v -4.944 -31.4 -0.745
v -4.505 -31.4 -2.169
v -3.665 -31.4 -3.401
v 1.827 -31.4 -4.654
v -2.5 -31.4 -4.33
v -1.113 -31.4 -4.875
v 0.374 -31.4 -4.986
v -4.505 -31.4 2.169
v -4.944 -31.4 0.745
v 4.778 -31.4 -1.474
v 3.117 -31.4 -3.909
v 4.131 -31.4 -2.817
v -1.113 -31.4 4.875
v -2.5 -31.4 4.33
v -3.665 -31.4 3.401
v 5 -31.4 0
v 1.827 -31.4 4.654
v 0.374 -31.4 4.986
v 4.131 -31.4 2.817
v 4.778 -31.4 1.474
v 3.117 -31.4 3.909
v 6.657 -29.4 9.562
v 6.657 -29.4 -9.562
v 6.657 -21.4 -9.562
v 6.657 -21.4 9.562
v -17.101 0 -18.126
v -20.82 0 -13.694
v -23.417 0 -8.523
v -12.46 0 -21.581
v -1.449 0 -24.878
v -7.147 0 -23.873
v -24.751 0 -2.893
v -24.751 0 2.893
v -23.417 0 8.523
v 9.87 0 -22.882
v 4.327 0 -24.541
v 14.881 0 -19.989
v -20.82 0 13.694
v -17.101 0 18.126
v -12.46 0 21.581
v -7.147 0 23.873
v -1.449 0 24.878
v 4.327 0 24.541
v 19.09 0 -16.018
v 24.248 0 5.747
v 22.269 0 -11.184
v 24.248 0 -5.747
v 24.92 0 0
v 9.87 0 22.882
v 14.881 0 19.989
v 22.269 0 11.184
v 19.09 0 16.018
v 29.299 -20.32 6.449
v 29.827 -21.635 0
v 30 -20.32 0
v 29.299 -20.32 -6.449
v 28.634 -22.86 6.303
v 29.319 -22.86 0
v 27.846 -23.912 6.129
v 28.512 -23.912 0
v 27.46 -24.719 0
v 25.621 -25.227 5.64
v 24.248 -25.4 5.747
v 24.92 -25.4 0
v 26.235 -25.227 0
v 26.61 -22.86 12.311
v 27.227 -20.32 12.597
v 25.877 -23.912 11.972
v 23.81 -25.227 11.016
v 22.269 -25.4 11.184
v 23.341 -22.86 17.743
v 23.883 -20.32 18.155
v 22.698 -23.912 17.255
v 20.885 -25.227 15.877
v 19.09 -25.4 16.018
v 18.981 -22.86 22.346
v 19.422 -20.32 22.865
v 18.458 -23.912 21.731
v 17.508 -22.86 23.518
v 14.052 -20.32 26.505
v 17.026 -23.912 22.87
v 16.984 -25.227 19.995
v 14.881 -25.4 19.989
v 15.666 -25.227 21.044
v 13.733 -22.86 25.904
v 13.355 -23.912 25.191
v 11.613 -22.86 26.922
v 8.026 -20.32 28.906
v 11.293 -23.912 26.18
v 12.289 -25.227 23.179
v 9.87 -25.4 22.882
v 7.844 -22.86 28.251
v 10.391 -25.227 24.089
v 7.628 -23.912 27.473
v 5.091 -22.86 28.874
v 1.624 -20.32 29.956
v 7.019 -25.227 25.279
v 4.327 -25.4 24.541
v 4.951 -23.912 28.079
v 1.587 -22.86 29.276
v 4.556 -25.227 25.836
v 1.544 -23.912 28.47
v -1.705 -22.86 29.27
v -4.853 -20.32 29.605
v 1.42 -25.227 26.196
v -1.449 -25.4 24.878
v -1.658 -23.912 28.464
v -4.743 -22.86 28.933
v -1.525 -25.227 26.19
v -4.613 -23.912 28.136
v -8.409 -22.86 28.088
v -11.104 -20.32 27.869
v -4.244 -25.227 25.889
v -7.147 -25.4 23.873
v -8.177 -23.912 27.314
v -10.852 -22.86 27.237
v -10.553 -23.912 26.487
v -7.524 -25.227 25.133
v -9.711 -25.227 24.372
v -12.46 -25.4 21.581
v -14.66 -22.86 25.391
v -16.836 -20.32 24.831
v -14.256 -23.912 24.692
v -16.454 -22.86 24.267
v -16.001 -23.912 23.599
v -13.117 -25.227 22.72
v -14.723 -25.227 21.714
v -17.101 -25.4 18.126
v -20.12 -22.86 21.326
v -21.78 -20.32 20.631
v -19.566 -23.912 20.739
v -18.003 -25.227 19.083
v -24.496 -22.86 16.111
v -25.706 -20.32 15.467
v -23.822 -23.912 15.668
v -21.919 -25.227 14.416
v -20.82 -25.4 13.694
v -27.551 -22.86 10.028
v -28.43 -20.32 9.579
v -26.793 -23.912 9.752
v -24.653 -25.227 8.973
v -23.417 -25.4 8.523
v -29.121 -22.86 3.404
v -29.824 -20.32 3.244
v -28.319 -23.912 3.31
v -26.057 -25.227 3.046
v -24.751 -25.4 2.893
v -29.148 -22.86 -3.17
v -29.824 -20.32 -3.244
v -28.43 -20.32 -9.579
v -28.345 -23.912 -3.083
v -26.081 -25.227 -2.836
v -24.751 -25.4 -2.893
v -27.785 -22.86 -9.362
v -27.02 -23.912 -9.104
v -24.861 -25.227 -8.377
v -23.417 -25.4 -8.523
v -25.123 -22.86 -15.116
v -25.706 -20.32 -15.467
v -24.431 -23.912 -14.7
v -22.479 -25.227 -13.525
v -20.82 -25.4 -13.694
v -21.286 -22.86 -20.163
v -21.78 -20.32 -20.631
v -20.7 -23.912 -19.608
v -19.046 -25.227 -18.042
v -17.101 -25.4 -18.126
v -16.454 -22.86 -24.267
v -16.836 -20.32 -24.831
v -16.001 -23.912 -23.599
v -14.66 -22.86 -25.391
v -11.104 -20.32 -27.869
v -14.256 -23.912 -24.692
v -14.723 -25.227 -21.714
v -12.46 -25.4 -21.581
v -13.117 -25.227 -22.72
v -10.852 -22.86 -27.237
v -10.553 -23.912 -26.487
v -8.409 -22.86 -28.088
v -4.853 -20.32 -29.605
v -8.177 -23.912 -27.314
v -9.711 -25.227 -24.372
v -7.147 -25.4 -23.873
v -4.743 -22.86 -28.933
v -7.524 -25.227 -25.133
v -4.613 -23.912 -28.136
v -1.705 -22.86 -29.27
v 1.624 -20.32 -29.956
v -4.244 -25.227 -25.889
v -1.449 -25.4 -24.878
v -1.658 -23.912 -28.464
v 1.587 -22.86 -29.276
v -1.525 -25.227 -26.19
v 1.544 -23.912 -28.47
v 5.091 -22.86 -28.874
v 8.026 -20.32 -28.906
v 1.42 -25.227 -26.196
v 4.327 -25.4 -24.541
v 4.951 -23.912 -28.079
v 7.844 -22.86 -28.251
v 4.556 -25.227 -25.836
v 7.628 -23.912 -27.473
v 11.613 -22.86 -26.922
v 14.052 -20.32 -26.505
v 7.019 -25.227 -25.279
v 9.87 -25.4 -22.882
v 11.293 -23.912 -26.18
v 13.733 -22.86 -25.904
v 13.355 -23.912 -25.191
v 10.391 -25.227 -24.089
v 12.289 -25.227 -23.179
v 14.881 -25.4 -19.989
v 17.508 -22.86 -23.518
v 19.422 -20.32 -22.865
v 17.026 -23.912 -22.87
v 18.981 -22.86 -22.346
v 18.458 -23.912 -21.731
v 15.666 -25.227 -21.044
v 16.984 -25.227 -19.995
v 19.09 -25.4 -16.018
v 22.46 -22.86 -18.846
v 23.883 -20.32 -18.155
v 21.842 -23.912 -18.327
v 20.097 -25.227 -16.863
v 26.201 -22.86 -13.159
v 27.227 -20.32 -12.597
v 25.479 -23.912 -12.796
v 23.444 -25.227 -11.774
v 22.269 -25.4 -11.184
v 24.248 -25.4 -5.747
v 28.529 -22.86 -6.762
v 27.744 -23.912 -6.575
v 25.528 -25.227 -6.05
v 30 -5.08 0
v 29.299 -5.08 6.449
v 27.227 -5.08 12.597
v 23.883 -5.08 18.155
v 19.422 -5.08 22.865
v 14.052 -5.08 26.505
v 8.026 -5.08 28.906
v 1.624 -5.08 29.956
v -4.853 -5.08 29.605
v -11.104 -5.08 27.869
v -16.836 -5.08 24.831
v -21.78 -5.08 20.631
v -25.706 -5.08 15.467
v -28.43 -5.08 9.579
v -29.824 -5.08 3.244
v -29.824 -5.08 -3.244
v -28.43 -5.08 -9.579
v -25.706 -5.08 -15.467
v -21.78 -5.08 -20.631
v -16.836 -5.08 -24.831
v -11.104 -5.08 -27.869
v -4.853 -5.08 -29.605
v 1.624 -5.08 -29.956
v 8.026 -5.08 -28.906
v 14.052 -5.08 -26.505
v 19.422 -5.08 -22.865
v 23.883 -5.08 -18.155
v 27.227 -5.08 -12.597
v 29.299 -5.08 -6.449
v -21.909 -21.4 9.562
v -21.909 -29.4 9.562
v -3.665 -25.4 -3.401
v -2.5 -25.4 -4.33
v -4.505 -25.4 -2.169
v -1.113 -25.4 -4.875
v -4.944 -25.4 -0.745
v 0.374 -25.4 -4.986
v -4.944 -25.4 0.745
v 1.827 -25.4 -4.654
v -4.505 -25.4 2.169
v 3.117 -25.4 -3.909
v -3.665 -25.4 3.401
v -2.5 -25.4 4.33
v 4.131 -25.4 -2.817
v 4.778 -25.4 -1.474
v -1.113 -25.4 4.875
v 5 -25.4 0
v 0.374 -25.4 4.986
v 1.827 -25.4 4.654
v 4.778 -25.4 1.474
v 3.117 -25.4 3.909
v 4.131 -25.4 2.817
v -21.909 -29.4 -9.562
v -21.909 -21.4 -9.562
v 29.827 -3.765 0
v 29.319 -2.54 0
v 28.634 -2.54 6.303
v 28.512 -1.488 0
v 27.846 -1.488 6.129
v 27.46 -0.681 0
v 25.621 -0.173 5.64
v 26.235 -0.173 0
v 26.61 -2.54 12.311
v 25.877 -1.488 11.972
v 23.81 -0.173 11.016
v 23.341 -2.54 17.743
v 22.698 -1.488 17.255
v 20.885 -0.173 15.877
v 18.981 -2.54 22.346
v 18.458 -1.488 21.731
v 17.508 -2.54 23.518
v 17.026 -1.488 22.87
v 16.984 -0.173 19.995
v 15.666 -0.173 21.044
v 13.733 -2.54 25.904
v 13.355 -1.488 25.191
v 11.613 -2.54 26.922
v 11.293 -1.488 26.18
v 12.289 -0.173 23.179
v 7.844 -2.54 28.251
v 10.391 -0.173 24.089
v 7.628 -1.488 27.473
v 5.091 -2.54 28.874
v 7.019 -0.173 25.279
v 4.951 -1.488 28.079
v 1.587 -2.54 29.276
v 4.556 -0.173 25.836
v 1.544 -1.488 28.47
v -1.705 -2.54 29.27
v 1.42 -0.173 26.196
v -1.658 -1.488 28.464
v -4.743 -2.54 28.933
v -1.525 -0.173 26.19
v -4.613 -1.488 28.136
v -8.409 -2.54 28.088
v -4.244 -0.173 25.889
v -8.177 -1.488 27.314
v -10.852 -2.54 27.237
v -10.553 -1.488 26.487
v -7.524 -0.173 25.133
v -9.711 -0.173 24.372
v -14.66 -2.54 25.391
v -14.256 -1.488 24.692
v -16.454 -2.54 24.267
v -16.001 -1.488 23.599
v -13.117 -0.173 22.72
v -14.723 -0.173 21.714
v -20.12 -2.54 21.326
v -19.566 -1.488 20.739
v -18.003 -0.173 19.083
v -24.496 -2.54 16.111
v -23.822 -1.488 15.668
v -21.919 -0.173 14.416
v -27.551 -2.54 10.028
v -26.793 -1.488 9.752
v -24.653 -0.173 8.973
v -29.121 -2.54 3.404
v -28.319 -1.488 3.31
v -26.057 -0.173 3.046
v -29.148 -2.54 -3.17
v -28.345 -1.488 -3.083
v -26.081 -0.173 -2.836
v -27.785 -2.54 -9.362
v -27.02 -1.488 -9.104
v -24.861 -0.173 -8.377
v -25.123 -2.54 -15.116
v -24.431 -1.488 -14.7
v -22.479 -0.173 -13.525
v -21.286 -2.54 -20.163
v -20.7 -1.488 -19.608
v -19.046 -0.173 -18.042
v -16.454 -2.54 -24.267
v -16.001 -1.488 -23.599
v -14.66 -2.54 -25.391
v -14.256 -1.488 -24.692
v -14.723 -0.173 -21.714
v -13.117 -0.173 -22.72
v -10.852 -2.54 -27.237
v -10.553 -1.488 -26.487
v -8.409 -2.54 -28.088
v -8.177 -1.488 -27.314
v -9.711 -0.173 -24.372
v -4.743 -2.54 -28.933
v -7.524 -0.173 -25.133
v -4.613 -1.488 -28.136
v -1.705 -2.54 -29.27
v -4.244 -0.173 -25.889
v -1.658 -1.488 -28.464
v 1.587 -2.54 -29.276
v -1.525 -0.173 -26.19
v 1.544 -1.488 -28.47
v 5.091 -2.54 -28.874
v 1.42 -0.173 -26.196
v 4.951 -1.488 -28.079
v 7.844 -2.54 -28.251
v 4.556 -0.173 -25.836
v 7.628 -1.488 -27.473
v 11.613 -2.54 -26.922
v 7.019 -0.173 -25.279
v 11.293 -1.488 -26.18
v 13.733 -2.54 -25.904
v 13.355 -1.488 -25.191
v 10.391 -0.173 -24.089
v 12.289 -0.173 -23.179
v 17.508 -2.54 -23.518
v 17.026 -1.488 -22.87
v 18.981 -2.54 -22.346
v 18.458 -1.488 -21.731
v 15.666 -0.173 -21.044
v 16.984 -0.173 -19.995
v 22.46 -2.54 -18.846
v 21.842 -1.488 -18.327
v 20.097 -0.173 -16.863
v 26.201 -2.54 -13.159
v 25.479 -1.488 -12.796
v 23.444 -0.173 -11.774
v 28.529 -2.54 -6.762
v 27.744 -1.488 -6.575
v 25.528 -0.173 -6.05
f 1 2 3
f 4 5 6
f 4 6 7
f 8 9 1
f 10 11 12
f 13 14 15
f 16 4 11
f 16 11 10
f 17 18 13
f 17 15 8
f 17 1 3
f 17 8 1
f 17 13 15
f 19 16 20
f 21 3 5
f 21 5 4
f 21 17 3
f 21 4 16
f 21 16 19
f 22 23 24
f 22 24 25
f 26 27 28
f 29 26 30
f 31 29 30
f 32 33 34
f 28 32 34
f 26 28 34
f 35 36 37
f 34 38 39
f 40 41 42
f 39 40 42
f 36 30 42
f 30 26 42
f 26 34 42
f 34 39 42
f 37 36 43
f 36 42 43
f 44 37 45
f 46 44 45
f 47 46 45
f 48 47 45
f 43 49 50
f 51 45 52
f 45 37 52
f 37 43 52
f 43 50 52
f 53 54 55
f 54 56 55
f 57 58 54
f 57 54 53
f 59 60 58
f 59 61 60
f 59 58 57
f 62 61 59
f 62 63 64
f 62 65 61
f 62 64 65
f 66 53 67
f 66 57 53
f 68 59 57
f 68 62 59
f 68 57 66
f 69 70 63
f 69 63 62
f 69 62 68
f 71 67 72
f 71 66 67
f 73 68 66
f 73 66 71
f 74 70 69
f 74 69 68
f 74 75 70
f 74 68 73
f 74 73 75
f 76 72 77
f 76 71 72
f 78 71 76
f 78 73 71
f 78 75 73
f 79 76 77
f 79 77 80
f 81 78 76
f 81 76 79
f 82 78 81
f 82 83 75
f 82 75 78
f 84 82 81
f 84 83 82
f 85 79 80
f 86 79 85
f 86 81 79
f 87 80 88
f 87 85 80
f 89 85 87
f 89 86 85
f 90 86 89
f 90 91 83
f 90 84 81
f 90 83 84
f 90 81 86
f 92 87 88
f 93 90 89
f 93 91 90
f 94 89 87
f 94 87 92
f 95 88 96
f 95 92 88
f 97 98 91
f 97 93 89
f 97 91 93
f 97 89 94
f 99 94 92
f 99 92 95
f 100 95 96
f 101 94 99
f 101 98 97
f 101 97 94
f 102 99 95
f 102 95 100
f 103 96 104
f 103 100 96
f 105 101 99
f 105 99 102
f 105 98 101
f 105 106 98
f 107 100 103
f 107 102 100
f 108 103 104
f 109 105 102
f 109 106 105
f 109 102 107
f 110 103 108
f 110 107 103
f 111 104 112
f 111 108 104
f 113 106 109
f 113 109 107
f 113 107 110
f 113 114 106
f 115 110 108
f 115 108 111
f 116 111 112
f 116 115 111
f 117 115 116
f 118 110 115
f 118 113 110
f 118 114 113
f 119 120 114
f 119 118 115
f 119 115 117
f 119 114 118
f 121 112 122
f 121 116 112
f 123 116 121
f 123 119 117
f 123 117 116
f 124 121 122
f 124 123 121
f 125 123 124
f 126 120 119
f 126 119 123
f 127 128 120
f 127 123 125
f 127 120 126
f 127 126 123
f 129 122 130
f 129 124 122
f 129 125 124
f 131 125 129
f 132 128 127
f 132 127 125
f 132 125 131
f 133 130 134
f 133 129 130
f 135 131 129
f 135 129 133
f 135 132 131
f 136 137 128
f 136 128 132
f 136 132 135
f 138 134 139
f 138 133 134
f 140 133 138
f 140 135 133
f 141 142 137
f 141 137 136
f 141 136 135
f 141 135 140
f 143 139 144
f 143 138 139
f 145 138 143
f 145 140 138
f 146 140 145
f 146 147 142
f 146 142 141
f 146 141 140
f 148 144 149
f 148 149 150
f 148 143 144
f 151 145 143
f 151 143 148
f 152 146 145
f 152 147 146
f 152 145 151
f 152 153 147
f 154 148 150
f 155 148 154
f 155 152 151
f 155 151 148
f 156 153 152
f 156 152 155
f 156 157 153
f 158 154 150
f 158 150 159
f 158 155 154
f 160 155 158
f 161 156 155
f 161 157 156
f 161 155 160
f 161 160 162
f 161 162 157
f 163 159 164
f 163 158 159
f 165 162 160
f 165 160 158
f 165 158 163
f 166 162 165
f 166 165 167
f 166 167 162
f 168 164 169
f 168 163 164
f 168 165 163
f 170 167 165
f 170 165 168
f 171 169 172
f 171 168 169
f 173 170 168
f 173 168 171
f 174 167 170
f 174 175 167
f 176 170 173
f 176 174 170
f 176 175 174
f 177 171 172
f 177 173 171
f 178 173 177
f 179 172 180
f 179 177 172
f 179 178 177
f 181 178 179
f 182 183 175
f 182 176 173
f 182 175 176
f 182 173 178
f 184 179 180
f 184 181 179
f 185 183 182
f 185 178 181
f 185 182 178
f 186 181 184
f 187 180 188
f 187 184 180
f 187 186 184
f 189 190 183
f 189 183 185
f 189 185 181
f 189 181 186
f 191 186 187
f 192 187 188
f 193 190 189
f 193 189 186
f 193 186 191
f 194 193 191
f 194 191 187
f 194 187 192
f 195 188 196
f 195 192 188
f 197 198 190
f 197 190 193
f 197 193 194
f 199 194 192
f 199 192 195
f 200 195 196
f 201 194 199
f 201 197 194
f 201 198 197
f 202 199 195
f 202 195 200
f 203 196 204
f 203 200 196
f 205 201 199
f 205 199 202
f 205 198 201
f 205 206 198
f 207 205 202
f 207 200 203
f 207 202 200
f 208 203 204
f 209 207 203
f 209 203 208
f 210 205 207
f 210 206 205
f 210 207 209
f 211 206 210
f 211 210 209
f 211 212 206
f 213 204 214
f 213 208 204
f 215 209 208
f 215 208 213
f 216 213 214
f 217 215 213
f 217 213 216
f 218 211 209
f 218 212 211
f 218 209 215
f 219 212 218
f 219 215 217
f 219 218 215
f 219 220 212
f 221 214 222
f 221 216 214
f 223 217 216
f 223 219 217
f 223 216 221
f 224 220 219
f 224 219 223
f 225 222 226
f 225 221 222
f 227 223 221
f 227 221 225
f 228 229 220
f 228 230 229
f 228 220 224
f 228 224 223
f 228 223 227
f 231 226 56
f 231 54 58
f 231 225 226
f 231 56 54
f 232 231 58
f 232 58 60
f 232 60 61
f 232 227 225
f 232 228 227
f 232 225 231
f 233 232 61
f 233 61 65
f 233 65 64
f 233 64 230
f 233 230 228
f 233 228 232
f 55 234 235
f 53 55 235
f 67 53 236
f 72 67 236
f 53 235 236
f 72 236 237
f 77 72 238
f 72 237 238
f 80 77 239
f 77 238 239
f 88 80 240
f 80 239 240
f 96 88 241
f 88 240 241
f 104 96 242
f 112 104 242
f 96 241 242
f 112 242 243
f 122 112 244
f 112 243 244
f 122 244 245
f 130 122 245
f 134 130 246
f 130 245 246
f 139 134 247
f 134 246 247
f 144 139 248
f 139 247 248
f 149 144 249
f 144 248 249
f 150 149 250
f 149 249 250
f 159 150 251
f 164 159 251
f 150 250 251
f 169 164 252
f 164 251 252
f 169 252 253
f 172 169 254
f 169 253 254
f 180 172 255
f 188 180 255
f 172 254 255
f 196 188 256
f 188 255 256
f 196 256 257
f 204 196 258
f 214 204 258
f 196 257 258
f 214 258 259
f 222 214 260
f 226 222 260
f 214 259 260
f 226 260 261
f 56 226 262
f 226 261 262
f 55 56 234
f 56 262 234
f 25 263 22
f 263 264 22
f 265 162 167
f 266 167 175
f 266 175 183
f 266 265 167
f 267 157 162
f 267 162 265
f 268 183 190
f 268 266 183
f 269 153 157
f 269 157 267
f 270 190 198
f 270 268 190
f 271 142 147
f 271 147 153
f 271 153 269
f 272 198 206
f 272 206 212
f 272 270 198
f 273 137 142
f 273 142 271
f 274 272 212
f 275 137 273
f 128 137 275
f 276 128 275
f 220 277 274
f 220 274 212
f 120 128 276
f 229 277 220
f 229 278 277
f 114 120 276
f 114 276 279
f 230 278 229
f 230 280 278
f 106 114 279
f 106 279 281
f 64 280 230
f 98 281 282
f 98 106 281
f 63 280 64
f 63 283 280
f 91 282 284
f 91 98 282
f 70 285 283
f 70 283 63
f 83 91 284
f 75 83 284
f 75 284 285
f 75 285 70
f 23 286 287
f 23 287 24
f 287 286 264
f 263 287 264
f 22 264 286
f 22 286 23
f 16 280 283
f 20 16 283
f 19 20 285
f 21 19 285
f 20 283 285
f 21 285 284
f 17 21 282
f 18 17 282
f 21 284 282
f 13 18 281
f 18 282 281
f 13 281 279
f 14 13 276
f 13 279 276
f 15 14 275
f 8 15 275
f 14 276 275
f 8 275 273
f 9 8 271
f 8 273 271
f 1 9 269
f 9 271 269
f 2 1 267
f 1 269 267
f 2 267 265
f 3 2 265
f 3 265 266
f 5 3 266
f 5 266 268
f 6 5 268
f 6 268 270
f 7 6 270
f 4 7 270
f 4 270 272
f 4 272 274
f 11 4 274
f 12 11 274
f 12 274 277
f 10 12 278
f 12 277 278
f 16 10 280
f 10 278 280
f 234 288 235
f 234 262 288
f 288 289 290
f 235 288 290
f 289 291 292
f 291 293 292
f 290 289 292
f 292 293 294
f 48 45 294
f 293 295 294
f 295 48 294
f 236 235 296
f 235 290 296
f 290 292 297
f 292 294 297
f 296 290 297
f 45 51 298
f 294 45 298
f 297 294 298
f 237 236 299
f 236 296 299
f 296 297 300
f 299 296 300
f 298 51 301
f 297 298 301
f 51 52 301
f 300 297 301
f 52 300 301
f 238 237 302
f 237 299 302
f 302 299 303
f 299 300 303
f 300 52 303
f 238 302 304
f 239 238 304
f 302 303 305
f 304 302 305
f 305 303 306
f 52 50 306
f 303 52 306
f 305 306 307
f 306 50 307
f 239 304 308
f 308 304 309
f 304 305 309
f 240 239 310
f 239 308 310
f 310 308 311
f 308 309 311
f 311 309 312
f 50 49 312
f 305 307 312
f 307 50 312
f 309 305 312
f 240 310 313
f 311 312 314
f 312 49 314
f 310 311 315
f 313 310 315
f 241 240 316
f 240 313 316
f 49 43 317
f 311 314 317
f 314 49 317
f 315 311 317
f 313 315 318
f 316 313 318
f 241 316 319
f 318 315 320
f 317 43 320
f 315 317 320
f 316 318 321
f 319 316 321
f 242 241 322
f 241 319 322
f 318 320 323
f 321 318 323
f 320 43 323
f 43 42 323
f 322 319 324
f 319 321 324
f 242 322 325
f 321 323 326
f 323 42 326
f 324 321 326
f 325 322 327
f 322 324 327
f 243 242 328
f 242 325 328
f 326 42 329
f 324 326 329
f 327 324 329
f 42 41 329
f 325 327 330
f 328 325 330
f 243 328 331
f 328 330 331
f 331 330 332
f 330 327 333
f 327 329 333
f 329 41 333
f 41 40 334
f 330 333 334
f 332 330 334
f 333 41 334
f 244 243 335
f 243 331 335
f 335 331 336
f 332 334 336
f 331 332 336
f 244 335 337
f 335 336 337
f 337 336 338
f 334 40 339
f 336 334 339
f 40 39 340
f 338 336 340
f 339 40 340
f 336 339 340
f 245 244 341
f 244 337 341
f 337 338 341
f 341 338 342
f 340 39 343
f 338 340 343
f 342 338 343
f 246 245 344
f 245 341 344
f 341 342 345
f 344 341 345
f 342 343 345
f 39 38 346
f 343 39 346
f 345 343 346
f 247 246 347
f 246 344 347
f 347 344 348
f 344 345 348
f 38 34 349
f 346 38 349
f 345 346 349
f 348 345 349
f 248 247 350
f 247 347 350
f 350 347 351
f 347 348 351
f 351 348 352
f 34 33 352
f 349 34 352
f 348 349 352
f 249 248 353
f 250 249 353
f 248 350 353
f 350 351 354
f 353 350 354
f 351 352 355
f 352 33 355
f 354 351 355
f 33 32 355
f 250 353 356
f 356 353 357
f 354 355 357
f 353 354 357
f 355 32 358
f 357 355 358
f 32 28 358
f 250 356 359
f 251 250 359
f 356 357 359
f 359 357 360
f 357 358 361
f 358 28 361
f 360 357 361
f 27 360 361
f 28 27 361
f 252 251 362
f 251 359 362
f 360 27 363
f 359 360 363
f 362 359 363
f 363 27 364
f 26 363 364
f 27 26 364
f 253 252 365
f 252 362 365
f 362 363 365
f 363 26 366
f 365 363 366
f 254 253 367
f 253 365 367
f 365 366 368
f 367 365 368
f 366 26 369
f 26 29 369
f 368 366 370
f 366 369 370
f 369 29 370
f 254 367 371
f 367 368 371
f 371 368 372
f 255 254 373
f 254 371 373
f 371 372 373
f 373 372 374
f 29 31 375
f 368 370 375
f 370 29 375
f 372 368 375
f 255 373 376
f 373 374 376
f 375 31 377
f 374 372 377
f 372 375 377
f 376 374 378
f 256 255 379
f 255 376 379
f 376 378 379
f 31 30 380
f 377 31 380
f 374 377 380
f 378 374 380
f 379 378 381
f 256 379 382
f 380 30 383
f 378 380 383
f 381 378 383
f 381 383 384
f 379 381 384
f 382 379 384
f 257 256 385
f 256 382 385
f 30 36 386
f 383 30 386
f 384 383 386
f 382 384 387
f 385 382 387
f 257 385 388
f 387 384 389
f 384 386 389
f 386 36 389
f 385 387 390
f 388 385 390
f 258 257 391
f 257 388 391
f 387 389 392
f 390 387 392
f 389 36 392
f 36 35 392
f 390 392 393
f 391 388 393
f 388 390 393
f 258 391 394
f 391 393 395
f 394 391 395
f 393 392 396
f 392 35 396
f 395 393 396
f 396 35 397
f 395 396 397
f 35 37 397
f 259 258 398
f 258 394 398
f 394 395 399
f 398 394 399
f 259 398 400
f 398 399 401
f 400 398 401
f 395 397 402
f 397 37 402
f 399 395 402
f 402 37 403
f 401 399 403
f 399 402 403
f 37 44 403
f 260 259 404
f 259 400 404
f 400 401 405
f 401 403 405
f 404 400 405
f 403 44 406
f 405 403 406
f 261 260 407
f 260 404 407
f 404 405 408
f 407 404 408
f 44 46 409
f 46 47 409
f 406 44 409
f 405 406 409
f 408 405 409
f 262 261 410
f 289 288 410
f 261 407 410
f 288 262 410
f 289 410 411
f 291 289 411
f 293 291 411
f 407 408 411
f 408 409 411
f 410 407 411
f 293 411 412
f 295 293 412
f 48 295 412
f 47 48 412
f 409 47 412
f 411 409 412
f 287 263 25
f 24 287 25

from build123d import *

# Parameters (mm, degrees)
F0_R     = 30
F1_DEPTH = 25.4
F2_R     = 5.08
F3_R     = 24.92
F3_R_2   = 5
F4_DEPTH = 25.4
F6_R     = 5
F7_DEPTH = 6
F8_W     = 28.566352
F8_H     = 19.124932
F9_DEPTH = 4


with BuildPart() as f1:
    # F0 (on Front) → F1 (new body)
    with BuildSketch(Plane.XZ):
        Circle(F0_R)
    extrude(amount=F1_DEPTH)

    # F2
    f2_edges = [f1.edges().sort_by_distance(p)[0] for p in [
        (-30, -25.4, 0),
        (-30, 0, 0),
    ]]
    fillet(f2_edges, radius=F2_R)

    # F3 (on face) → F4 (join)
    with BuildSketch(Plane.XZ.offset(25.4)):
        Circle(F3_R)
        Circle(F3_R_2, mode=Mode.SUBTRACT)
        Circle(F3_R_2)
    extrude(amount=-F4_DEPTH)

    # F6 (on face) → F7 (join)
    with BuildSketch(Plane.XZ.offset(25.4)):
        Circle(F6_R)
    extrude(amount=F7_DEPTH)


with BuildPart() as f9:
    # F8 (on face) → F9 (new body, symmetric)
    with BuildSketch(Plane.XZ.offset(25.4)):
        with Locations((-7.625764, 0)):
            Rectangle(F8_W, F8_H)
    extrude(amount=F9_DEPTH, both=True)


solid = Compound([f1.part, f9.part])
